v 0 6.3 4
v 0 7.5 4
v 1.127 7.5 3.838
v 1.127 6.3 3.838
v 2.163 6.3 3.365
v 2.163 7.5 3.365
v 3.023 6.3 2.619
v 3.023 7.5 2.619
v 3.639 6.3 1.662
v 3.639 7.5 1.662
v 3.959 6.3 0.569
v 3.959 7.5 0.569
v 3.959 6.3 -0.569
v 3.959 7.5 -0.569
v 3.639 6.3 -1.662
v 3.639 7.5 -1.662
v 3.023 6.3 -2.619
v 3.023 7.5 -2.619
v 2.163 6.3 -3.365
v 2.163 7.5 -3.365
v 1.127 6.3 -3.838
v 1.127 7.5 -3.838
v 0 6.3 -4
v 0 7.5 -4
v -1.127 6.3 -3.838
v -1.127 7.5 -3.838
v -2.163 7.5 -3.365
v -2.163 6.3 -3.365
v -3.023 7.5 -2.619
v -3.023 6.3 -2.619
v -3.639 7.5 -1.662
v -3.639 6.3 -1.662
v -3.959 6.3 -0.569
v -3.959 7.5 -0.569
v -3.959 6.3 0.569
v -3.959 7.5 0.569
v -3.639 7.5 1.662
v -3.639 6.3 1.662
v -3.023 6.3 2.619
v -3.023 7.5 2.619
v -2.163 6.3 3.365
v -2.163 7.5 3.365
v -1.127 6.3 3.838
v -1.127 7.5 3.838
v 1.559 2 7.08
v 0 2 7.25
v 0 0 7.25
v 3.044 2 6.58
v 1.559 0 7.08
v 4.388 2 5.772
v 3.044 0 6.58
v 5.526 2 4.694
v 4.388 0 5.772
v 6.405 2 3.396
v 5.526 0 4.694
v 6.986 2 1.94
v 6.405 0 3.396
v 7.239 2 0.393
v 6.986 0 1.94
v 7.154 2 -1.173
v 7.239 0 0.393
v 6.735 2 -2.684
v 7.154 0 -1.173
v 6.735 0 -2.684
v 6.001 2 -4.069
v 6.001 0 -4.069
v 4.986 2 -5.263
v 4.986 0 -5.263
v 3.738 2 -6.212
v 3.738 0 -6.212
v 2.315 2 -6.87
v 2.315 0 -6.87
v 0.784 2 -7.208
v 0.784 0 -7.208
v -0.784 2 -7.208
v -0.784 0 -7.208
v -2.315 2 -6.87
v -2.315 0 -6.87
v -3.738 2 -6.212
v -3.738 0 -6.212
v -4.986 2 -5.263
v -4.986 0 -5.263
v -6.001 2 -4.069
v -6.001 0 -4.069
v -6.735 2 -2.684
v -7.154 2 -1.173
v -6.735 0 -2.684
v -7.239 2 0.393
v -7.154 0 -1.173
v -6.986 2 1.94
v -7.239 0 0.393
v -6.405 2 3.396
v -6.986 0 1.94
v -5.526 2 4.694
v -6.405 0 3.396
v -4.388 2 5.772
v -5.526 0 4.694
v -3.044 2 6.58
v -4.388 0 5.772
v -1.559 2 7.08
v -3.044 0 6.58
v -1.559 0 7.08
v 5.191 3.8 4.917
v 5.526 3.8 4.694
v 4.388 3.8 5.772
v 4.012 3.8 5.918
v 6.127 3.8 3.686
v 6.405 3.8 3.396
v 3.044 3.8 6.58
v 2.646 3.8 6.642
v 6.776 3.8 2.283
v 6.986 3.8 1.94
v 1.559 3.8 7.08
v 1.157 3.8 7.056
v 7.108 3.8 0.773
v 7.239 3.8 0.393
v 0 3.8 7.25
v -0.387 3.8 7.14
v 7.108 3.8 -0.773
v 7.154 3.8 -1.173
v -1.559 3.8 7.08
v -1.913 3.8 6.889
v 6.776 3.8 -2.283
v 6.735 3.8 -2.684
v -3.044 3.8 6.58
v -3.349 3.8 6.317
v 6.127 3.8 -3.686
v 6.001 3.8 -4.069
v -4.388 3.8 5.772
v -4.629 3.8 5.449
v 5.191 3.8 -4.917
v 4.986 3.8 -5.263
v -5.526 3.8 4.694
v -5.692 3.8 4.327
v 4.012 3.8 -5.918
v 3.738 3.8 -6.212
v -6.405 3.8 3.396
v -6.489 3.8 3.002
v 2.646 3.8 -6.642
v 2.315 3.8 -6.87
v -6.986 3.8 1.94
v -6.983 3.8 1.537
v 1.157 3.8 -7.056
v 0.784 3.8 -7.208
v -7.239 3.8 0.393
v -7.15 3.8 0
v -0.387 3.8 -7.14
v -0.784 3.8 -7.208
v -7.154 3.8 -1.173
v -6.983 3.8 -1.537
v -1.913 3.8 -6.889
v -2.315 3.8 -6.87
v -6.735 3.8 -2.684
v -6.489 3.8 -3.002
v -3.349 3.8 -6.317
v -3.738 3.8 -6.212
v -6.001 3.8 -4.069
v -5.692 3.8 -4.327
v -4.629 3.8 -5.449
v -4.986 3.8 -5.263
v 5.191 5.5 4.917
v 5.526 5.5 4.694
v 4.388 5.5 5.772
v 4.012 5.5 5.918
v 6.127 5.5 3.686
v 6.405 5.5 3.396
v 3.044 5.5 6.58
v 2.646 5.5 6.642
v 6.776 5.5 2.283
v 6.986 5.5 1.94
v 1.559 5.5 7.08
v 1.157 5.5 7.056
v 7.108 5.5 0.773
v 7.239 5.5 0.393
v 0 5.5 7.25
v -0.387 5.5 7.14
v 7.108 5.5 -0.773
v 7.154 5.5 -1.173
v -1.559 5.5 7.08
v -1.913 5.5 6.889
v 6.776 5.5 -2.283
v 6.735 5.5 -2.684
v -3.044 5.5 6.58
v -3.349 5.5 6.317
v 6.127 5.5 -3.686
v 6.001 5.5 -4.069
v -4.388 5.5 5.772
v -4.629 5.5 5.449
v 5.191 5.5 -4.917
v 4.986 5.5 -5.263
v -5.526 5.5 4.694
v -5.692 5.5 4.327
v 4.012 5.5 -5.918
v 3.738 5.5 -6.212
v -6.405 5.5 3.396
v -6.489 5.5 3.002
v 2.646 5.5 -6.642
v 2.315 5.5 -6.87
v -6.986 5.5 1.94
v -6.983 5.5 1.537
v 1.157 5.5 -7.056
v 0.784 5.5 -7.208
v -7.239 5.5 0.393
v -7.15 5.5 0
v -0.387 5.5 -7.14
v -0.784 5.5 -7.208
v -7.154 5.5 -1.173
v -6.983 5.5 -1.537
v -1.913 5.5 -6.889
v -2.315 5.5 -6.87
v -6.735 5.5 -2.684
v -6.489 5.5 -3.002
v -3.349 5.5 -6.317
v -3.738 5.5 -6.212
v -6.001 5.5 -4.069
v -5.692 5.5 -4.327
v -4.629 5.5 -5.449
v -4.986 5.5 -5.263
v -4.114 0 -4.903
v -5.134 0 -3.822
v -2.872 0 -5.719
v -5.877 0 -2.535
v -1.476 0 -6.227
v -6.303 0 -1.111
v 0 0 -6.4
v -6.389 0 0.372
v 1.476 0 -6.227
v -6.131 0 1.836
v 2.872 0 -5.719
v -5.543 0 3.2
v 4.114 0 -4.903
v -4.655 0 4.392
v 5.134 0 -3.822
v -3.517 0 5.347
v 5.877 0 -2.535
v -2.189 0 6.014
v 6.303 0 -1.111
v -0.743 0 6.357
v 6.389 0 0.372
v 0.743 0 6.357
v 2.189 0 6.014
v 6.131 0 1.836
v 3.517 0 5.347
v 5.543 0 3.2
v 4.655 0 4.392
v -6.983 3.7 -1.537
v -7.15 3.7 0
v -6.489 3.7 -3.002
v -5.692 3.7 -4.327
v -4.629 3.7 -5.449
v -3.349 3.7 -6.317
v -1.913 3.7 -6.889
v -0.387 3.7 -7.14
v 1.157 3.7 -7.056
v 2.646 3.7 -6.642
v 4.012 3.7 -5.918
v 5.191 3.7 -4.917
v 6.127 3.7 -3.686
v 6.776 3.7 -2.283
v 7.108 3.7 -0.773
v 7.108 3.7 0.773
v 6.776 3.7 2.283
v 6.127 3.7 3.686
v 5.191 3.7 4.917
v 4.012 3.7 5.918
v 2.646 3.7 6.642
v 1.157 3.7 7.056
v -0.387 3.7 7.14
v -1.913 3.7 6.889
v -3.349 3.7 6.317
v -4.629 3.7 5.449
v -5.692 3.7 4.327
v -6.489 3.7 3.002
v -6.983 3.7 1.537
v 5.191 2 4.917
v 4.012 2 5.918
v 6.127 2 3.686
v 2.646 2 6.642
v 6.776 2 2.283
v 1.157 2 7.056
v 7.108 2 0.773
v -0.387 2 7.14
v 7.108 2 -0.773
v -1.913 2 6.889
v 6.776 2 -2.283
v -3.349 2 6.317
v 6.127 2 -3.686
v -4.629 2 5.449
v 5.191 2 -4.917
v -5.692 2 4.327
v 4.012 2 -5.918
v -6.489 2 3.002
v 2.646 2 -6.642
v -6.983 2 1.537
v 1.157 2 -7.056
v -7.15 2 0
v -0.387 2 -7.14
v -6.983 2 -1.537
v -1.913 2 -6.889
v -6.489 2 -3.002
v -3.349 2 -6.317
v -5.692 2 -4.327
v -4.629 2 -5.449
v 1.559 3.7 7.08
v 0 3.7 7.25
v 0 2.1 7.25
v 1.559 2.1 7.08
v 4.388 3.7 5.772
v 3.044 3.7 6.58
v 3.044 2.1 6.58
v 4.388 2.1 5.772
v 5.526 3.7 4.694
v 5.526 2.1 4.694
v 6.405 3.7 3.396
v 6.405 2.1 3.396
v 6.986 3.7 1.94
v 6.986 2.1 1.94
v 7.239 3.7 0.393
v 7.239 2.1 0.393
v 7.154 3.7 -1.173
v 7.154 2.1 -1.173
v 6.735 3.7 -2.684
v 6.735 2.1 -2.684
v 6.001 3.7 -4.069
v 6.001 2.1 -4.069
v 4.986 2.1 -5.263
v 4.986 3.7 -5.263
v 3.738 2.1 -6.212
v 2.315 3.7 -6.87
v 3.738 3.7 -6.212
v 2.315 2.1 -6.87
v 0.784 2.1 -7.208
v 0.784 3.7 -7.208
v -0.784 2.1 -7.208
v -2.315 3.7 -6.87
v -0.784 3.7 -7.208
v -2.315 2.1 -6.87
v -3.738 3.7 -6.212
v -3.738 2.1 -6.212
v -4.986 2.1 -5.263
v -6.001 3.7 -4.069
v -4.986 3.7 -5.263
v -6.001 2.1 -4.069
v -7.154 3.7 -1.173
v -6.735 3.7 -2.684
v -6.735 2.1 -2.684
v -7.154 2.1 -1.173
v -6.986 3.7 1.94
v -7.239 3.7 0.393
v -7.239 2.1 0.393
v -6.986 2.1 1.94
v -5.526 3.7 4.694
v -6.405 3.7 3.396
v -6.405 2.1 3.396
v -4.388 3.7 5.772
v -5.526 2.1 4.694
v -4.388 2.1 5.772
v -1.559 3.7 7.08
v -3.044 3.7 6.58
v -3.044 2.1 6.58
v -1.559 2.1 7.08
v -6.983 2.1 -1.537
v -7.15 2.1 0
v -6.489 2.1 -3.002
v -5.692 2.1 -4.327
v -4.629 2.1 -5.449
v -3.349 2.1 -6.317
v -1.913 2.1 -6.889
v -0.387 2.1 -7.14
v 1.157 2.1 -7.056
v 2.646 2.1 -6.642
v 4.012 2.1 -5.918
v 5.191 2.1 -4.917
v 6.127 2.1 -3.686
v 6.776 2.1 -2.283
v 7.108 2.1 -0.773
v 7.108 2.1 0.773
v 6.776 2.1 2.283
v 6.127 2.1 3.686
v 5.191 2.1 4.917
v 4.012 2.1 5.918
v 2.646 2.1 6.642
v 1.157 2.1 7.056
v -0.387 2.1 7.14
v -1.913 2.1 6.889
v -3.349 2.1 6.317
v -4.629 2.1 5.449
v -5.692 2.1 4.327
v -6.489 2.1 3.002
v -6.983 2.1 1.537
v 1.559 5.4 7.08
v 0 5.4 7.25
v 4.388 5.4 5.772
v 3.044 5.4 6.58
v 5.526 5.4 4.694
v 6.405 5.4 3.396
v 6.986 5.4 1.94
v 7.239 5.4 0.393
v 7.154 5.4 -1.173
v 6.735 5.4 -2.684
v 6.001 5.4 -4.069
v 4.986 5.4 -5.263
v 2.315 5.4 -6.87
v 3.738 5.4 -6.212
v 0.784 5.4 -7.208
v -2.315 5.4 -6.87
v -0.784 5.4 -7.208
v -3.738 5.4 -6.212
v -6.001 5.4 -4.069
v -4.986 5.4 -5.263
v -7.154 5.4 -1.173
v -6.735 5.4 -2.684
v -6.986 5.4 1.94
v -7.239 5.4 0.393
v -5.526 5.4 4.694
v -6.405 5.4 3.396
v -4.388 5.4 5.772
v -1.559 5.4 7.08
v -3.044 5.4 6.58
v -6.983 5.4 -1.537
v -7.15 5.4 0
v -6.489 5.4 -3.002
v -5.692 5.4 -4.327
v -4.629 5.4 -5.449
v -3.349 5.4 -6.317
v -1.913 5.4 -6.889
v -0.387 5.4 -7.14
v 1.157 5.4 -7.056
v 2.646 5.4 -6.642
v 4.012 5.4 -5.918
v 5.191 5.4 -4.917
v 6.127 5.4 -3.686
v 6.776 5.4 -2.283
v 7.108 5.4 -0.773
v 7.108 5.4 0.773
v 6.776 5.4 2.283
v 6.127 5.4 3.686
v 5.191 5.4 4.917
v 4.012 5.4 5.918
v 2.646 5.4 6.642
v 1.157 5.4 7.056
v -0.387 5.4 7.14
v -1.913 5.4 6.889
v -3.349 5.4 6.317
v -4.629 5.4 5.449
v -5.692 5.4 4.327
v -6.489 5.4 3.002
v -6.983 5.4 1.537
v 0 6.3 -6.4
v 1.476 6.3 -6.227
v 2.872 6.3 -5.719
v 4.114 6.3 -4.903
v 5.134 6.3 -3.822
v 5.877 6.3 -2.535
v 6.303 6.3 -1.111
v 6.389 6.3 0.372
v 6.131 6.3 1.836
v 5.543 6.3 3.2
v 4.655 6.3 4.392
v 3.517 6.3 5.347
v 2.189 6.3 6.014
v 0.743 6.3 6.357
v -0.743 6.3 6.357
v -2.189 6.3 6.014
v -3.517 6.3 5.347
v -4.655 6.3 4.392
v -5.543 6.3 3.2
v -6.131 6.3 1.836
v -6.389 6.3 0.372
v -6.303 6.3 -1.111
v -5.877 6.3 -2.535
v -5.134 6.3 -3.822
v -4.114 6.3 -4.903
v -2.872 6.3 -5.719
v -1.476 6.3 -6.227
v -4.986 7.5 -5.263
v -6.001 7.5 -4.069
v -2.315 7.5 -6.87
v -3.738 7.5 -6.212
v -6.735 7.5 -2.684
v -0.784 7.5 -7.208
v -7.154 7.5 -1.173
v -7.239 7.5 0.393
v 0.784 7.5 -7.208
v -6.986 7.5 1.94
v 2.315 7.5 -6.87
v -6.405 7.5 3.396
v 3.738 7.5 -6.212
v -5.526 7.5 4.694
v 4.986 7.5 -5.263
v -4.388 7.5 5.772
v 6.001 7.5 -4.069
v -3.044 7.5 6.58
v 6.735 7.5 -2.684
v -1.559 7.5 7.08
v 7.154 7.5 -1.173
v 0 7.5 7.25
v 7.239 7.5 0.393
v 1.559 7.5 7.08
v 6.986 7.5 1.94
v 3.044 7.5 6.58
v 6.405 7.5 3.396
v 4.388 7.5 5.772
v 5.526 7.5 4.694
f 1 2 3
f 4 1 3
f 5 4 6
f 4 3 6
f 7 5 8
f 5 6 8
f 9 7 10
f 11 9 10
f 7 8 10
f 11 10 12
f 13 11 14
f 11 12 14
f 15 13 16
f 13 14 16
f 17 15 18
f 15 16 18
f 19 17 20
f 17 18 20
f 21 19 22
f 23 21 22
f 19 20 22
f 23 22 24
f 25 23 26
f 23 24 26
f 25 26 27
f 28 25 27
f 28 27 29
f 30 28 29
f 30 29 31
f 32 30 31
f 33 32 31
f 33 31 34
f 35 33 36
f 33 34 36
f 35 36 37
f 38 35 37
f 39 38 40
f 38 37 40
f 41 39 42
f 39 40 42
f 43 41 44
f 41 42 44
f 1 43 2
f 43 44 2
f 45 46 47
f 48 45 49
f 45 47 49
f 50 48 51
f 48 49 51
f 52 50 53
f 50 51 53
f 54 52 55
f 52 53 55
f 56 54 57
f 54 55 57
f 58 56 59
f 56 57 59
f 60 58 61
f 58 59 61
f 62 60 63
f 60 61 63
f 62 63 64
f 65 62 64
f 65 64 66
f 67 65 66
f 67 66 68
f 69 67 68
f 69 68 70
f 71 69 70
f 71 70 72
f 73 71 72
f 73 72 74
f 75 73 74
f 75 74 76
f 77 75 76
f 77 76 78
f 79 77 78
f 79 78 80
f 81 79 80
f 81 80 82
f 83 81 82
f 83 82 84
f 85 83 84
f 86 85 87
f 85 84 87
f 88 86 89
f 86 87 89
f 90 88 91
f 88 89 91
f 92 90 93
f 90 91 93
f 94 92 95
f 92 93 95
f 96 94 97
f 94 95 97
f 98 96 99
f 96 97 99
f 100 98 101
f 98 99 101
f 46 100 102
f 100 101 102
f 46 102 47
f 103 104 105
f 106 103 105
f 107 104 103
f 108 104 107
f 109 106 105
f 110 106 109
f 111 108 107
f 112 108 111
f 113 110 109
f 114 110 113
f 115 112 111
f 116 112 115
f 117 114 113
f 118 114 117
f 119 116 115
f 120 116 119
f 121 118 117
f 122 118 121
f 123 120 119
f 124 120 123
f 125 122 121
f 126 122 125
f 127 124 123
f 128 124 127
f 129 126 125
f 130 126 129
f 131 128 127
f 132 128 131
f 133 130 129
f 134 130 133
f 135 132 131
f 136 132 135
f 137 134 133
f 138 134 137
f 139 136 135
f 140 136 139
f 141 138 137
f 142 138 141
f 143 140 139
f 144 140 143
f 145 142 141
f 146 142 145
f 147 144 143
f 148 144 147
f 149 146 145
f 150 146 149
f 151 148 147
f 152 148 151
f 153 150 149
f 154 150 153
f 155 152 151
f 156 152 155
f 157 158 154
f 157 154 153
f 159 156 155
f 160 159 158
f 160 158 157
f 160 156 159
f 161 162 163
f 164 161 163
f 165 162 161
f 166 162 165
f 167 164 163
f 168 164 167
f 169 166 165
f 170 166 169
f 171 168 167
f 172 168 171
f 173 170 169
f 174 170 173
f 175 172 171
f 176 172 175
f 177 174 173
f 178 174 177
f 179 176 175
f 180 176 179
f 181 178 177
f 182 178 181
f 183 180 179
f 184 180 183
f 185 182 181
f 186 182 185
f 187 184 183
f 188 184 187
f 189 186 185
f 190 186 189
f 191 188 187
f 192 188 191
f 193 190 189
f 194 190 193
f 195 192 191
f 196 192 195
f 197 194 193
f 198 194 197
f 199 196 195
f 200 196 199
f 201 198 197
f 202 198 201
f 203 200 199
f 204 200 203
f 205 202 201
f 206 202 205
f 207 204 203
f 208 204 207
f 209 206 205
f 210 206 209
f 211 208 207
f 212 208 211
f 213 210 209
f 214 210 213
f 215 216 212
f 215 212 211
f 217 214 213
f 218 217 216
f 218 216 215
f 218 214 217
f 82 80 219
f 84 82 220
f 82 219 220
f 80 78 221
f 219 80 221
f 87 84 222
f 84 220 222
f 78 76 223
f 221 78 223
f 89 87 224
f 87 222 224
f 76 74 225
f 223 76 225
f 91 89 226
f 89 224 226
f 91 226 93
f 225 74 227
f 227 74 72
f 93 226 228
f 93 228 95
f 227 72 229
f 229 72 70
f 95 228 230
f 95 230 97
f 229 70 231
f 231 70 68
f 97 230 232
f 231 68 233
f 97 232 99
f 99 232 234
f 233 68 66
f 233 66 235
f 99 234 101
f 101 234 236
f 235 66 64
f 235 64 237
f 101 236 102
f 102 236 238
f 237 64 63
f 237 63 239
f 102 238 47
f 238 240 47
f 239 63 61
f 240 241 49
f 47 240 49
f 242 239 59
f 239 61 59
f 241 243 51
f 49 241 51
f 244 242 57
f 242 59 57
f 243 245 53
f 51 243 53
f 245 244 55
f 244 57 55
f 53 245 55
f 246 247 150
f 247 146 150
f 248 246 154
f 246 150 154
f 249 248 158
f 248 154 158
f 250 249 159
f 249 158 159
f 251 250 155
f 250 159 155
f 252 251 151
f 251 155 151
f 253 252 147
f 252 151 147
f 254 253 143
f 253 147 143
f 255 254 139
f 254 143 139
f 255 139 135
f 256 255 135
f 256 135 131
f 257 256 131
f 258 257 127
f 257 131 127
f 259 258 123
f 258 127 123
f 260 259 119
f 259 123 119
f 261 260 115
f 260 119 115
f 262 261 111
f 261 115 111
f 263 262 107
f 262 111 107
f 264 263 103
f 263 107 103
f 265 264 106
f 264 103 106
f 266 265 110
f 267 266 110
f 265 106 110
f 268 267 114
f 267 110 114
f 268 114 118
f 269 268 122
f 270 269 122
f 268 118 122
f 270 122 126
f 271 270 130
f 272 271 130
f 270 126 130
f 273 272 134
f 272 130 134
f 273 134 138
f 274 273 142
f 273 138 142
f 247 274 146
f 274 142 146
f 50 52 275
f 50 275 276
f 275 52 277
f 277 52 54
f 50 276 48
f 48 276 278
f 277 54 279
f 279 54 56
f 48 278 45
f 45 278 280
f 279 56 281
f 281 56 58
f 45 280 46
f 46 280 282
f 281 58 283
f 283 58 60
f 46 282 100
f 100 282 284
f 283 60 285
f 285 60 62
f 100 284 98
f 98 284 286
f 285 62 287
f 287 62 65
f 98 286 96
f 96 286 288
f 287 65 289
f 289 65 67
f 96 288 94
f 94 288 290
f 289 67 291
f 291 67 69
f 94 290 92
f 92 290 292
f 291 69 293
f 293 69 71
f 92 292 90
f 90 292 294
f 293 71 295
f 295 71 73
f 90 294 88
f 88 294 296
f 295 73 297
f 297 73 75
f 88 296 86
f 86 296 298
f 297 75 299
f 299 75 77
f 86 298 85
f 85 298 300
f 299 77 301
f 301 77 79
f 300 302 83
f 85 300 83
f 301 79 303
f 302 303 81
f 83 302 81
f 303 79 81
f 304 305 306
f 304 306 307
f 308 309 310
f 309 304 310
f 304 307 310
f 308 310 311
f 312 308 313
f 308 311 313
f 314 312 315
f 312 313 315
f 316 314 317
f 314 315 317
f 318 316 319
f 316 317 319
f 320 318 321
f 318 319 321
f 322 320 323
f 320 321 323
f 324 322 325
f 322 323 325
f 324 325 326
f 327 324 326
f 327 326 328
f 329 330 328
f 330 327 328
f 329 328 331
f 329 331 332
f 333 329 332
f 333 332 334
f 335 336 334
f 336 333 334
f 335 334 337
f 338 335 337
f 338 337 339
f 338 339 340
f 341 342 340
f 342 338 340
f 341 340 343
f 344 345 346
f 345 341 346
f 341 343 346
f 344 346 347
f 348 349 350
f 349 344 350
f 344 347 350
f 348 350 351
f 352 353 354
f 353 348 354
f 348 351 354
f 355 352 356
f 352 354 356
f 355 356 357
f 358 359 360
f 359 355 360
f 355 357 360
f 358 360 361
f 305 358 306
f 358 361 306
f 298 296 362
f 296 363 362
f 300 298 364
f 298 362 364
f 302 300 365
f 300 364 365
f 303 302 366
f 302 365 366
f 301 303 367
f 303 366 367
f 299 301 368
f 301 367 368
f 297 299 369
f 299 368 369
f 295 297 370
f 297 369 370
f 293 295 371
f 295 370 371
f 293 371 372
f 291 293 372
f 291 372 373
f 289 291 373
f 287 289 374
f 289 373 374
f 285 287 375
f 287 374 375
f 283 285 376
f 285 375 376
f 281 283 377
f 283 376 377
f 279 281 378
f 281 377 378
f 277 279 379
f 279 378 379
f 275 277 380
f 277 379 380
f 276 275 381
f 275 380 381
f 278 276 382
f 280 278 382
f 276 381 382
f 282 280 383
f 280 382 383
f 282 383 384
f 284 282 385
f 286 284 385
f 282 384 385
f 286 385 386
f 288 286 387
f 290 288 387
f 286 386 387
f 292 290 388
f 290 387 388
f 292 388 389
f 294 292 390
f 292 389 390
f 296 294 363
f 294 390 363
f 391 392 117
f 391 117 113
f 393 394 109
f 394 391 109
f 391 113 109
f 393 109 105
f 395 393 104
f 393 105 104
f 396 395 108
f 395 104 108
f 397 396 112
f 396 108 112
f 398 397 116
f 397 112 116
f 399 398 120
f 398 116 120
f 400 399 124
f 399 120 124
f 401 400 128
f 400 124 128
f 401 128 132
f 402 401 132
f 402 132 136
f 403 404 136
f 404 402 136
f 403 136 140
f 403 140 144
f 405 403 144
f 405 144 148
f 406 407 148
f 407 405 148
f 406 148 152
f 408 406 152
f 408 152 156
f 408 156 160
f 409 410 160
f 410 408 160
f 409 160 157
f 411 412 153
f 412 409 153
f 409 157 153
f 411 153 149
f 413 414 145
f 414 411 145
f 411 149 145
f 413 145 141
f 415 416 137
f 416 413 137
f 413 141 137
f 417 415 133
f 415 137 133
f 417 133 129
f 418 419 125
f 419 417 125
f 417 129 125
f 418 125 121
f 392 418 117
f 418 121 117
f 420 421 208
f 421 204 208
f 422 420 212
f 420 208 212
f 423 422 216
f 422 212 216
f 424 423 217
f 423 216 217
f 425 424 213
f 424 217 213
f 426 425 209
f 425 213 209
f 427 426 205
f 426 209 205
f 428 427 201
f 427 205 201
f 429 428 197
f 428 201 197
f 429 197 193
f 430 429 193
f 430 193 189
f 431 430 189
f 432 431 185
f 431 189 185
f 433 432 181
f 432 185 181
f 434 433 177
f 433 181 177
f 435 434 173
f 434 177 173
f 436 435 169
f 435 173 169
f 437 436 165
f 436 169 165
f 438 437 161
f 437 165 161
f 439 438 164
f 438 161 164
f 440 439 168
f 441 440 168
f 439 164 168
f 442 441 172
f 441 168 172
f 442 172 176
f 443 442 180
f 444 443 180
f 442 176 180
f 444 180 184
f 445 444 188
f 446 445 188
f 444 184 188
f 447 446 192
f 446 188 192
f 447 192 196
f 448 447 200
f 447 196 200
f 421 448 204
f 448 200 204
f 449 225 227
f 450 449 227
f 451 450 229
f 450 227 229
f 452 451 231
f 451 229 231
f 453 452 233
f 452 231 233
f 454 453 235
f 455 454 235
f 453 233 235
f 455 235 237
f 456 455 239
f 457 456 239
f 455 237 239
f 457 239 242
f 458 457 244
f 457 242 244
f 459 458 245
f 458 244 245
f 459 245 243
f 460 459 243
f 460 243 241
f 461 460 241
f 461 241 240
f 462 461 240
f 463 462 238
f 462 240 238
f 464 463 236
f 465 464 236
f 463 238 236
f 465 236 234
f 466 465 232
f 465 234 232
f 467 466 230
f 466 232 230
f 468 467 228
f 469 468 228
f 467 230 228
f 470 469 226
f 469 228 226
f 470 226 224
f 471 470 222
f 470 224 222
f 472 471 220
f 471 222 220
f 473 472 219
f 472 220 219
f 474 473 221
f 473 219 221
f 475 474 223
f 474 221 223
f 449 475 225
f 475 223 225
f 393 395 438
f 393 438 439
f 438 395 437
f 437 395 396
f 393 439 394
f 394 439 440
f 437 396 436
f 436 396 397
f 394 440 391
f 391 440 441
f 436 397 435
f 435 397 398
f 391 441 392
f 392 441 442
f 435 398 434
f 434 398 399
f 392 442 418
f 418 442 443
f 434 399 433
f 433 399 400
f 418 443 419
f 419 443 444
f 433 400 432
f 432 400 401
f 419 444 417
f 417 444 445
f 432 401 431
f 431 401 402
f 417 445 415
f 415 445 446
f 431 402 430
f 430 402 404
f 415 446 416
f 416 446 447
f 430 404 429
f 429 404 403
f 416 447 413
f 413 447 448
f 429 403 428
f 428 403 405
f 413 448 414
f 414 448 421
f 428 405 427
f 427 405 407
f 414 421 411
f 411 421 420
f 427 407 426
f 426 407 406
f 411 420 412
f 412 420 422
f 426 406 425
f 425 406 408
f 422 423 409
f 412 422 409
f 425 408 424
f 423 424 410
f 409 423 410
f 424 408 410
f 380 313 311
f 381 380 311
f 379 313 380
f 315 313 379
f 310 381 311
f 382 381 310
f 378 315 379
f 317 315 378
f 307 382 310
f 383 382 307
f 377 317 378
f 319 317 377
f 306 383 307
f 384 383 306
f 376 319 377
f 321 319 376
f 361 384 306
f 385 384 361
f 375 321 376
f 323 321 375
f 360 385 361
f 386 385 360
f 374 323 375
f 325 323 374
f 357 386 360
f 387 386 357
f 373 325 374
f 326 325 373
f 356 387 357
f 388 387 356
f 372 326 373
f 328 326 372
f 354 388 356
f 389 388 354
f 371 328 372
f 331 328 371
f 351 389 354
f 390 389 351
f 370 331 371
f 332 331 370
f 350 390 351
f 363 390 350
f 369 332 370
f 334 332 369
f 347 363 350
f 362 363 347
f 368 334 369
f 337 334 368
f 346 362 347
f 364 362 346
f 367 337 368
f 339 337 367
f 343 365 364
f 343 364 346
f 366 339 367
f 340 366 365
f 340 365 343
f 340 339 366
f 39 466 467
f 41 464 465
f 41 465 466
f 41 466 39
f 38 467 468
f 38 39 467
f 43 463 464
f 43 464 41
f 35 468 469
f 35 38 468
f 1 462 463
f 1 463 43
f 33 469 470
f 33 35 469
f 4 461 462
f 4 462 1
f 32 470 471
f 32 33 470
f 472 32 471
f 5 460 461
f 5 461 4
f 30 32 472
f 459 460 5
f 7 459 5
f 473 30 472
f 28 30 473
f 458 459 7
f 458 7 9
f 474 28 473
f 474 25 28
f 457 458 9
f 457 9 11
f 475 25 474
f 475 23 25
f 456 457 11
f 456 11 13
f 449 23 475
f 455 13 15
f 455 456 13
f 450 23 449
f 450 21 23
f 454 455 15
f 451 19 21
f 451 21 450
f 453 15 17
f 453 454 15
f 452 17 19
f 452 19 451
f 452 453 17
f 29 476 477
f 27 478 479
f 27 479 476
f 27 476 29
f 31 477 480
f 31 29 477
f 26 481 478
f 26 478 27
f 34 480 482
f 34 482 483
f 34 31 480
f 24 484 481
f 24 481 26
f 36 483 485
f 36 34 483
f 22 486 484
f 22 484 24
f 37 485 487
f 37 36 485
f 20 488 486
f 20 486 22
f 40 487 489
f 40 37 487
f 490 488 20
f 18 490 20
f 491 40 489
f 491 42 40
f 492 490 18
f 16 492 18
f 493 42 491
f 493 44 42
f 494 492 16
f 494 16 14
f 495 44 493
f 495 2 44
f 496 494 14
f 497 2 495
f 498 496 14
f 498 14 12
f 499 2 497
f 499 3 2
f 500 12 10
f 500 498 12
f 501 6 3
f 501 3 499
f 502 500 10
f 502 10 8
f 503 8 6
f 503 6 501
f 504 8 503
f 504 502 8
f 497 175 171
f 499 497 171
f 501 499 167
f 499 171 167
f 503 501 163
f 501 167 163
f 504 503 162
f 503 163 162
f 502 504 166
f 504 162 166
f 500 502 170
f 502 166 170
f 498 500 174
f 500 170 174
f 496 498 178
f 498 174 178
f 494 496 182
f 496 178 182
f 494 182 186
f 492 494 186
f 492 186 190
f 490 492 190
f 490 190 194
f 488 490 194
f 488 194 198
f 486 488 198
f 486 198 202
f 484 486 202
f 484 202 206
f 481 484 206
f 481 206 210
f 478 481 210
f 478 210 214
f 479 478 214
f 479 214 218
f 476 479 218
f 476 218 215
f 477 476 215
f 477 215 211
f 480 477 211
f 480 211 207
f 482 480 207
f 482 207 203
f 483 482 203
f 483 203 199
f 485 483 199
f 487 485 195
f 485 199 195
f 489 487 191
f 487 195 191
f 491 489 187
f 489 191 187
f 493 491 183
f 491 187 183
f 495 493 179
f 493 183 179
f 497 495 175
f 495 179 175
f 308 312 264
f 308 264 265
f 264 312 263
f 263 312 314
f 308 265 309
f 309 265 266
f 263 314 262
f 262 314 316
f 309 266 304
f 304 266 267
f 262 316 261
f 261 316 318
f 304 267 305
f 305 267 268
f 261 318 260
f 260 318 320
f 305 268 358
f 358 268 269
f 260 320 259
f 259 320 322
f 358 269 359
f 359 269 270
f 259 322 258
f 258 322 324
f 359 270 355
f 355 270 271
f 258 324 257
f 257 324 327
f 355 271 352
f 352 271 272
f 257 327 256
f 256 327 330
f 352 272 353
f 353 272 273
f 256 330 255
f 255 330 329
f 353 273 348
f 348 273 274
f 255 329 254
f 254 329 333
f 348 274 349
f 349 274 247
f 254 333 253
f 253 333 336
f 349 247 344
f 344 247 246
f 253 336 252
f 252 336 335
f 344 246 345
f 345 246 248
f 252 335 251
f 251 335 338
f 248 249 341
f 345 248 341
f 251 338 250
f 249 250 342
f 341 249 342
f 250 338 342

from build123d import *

# Parameters (mm, degrees)
SKETCH_1_R          = 7.25
EXTRUDE_1_DEPTH     = 7.5
SKETCH_2_R          = 6.4
CUT_EXTRUDE_1_DEPTH = 6.3
SKETCH_4_R          = 4
CUT_EXTRUDE_2_DEPTH = 1.2
SKETCH_3_W          = 0.1
SKETCH_3_H          = 0.1


with BuildPart() as part:
    # ｽｹｯﾁ1 → ﾎﾞｽ - 押し出し1 (new body)
    with BuildSketch(Plane(origin=(0, 0, 0), x_dir=(1, 0, 0), z_dir=(0, 1, 0))):
        with Locations(Location((0, 0, 0), (0, 0, 270))):
            Circle(SKETCH_1_R)
    extrude(amount=EXTRUDE_1_DEPTH)

    # ｽｹｯﾁ2 → ｶｯﾄ - 押し出し1 (cut)
    with BuildSketch(Plane.XZ):
        with Locations(Location((0, 0, 0), (0, 0, 270))):
            Circle(SKETCH_2_R)
    extrude(amount=-CUT_EXTRUDE_1_DEPTH, mode=Mode.SUBTRACT)

    # ｽｹｯﾁ4 → ｶｯﾄ - 押し出し2 (cut)
    with BuildSketch(Plane(origin=(0, 7.5, 0), x_dir=(1, 0, 0), z_dir=(0, 1, 0))):
        with Locations(Location((0, 0, 0), (0, 0, 270))):
            Circle(SKETCH_4_R)
    extrude(amount=-CUT_EXTRUDE_2_DEPTH, mode=Mode.SUBTRACT)

    # ｽｹｯﾁ3 → ｶｯﾄ - 回転1 (revolve, cut)
    with BuildSketch(Plane.XY):
        with Locations((-7.2, 5.45)):
            Rectangle(SKETCH_3_W, SKETCH_3_H)
        with Locations((-7.2, 3.75)):
            Rectangle(SKETCH_3_W, SKETCH_3_H)
        with Locations((-7.2, 2.05)):
            Rectangle(SKETCH_3_W, SKETCH_3_H)
    revolve(axis=Axis((0, 7.5, 0), (0, -1, 0)), mode=Mode.SUBTRACT)


solid = part.part
